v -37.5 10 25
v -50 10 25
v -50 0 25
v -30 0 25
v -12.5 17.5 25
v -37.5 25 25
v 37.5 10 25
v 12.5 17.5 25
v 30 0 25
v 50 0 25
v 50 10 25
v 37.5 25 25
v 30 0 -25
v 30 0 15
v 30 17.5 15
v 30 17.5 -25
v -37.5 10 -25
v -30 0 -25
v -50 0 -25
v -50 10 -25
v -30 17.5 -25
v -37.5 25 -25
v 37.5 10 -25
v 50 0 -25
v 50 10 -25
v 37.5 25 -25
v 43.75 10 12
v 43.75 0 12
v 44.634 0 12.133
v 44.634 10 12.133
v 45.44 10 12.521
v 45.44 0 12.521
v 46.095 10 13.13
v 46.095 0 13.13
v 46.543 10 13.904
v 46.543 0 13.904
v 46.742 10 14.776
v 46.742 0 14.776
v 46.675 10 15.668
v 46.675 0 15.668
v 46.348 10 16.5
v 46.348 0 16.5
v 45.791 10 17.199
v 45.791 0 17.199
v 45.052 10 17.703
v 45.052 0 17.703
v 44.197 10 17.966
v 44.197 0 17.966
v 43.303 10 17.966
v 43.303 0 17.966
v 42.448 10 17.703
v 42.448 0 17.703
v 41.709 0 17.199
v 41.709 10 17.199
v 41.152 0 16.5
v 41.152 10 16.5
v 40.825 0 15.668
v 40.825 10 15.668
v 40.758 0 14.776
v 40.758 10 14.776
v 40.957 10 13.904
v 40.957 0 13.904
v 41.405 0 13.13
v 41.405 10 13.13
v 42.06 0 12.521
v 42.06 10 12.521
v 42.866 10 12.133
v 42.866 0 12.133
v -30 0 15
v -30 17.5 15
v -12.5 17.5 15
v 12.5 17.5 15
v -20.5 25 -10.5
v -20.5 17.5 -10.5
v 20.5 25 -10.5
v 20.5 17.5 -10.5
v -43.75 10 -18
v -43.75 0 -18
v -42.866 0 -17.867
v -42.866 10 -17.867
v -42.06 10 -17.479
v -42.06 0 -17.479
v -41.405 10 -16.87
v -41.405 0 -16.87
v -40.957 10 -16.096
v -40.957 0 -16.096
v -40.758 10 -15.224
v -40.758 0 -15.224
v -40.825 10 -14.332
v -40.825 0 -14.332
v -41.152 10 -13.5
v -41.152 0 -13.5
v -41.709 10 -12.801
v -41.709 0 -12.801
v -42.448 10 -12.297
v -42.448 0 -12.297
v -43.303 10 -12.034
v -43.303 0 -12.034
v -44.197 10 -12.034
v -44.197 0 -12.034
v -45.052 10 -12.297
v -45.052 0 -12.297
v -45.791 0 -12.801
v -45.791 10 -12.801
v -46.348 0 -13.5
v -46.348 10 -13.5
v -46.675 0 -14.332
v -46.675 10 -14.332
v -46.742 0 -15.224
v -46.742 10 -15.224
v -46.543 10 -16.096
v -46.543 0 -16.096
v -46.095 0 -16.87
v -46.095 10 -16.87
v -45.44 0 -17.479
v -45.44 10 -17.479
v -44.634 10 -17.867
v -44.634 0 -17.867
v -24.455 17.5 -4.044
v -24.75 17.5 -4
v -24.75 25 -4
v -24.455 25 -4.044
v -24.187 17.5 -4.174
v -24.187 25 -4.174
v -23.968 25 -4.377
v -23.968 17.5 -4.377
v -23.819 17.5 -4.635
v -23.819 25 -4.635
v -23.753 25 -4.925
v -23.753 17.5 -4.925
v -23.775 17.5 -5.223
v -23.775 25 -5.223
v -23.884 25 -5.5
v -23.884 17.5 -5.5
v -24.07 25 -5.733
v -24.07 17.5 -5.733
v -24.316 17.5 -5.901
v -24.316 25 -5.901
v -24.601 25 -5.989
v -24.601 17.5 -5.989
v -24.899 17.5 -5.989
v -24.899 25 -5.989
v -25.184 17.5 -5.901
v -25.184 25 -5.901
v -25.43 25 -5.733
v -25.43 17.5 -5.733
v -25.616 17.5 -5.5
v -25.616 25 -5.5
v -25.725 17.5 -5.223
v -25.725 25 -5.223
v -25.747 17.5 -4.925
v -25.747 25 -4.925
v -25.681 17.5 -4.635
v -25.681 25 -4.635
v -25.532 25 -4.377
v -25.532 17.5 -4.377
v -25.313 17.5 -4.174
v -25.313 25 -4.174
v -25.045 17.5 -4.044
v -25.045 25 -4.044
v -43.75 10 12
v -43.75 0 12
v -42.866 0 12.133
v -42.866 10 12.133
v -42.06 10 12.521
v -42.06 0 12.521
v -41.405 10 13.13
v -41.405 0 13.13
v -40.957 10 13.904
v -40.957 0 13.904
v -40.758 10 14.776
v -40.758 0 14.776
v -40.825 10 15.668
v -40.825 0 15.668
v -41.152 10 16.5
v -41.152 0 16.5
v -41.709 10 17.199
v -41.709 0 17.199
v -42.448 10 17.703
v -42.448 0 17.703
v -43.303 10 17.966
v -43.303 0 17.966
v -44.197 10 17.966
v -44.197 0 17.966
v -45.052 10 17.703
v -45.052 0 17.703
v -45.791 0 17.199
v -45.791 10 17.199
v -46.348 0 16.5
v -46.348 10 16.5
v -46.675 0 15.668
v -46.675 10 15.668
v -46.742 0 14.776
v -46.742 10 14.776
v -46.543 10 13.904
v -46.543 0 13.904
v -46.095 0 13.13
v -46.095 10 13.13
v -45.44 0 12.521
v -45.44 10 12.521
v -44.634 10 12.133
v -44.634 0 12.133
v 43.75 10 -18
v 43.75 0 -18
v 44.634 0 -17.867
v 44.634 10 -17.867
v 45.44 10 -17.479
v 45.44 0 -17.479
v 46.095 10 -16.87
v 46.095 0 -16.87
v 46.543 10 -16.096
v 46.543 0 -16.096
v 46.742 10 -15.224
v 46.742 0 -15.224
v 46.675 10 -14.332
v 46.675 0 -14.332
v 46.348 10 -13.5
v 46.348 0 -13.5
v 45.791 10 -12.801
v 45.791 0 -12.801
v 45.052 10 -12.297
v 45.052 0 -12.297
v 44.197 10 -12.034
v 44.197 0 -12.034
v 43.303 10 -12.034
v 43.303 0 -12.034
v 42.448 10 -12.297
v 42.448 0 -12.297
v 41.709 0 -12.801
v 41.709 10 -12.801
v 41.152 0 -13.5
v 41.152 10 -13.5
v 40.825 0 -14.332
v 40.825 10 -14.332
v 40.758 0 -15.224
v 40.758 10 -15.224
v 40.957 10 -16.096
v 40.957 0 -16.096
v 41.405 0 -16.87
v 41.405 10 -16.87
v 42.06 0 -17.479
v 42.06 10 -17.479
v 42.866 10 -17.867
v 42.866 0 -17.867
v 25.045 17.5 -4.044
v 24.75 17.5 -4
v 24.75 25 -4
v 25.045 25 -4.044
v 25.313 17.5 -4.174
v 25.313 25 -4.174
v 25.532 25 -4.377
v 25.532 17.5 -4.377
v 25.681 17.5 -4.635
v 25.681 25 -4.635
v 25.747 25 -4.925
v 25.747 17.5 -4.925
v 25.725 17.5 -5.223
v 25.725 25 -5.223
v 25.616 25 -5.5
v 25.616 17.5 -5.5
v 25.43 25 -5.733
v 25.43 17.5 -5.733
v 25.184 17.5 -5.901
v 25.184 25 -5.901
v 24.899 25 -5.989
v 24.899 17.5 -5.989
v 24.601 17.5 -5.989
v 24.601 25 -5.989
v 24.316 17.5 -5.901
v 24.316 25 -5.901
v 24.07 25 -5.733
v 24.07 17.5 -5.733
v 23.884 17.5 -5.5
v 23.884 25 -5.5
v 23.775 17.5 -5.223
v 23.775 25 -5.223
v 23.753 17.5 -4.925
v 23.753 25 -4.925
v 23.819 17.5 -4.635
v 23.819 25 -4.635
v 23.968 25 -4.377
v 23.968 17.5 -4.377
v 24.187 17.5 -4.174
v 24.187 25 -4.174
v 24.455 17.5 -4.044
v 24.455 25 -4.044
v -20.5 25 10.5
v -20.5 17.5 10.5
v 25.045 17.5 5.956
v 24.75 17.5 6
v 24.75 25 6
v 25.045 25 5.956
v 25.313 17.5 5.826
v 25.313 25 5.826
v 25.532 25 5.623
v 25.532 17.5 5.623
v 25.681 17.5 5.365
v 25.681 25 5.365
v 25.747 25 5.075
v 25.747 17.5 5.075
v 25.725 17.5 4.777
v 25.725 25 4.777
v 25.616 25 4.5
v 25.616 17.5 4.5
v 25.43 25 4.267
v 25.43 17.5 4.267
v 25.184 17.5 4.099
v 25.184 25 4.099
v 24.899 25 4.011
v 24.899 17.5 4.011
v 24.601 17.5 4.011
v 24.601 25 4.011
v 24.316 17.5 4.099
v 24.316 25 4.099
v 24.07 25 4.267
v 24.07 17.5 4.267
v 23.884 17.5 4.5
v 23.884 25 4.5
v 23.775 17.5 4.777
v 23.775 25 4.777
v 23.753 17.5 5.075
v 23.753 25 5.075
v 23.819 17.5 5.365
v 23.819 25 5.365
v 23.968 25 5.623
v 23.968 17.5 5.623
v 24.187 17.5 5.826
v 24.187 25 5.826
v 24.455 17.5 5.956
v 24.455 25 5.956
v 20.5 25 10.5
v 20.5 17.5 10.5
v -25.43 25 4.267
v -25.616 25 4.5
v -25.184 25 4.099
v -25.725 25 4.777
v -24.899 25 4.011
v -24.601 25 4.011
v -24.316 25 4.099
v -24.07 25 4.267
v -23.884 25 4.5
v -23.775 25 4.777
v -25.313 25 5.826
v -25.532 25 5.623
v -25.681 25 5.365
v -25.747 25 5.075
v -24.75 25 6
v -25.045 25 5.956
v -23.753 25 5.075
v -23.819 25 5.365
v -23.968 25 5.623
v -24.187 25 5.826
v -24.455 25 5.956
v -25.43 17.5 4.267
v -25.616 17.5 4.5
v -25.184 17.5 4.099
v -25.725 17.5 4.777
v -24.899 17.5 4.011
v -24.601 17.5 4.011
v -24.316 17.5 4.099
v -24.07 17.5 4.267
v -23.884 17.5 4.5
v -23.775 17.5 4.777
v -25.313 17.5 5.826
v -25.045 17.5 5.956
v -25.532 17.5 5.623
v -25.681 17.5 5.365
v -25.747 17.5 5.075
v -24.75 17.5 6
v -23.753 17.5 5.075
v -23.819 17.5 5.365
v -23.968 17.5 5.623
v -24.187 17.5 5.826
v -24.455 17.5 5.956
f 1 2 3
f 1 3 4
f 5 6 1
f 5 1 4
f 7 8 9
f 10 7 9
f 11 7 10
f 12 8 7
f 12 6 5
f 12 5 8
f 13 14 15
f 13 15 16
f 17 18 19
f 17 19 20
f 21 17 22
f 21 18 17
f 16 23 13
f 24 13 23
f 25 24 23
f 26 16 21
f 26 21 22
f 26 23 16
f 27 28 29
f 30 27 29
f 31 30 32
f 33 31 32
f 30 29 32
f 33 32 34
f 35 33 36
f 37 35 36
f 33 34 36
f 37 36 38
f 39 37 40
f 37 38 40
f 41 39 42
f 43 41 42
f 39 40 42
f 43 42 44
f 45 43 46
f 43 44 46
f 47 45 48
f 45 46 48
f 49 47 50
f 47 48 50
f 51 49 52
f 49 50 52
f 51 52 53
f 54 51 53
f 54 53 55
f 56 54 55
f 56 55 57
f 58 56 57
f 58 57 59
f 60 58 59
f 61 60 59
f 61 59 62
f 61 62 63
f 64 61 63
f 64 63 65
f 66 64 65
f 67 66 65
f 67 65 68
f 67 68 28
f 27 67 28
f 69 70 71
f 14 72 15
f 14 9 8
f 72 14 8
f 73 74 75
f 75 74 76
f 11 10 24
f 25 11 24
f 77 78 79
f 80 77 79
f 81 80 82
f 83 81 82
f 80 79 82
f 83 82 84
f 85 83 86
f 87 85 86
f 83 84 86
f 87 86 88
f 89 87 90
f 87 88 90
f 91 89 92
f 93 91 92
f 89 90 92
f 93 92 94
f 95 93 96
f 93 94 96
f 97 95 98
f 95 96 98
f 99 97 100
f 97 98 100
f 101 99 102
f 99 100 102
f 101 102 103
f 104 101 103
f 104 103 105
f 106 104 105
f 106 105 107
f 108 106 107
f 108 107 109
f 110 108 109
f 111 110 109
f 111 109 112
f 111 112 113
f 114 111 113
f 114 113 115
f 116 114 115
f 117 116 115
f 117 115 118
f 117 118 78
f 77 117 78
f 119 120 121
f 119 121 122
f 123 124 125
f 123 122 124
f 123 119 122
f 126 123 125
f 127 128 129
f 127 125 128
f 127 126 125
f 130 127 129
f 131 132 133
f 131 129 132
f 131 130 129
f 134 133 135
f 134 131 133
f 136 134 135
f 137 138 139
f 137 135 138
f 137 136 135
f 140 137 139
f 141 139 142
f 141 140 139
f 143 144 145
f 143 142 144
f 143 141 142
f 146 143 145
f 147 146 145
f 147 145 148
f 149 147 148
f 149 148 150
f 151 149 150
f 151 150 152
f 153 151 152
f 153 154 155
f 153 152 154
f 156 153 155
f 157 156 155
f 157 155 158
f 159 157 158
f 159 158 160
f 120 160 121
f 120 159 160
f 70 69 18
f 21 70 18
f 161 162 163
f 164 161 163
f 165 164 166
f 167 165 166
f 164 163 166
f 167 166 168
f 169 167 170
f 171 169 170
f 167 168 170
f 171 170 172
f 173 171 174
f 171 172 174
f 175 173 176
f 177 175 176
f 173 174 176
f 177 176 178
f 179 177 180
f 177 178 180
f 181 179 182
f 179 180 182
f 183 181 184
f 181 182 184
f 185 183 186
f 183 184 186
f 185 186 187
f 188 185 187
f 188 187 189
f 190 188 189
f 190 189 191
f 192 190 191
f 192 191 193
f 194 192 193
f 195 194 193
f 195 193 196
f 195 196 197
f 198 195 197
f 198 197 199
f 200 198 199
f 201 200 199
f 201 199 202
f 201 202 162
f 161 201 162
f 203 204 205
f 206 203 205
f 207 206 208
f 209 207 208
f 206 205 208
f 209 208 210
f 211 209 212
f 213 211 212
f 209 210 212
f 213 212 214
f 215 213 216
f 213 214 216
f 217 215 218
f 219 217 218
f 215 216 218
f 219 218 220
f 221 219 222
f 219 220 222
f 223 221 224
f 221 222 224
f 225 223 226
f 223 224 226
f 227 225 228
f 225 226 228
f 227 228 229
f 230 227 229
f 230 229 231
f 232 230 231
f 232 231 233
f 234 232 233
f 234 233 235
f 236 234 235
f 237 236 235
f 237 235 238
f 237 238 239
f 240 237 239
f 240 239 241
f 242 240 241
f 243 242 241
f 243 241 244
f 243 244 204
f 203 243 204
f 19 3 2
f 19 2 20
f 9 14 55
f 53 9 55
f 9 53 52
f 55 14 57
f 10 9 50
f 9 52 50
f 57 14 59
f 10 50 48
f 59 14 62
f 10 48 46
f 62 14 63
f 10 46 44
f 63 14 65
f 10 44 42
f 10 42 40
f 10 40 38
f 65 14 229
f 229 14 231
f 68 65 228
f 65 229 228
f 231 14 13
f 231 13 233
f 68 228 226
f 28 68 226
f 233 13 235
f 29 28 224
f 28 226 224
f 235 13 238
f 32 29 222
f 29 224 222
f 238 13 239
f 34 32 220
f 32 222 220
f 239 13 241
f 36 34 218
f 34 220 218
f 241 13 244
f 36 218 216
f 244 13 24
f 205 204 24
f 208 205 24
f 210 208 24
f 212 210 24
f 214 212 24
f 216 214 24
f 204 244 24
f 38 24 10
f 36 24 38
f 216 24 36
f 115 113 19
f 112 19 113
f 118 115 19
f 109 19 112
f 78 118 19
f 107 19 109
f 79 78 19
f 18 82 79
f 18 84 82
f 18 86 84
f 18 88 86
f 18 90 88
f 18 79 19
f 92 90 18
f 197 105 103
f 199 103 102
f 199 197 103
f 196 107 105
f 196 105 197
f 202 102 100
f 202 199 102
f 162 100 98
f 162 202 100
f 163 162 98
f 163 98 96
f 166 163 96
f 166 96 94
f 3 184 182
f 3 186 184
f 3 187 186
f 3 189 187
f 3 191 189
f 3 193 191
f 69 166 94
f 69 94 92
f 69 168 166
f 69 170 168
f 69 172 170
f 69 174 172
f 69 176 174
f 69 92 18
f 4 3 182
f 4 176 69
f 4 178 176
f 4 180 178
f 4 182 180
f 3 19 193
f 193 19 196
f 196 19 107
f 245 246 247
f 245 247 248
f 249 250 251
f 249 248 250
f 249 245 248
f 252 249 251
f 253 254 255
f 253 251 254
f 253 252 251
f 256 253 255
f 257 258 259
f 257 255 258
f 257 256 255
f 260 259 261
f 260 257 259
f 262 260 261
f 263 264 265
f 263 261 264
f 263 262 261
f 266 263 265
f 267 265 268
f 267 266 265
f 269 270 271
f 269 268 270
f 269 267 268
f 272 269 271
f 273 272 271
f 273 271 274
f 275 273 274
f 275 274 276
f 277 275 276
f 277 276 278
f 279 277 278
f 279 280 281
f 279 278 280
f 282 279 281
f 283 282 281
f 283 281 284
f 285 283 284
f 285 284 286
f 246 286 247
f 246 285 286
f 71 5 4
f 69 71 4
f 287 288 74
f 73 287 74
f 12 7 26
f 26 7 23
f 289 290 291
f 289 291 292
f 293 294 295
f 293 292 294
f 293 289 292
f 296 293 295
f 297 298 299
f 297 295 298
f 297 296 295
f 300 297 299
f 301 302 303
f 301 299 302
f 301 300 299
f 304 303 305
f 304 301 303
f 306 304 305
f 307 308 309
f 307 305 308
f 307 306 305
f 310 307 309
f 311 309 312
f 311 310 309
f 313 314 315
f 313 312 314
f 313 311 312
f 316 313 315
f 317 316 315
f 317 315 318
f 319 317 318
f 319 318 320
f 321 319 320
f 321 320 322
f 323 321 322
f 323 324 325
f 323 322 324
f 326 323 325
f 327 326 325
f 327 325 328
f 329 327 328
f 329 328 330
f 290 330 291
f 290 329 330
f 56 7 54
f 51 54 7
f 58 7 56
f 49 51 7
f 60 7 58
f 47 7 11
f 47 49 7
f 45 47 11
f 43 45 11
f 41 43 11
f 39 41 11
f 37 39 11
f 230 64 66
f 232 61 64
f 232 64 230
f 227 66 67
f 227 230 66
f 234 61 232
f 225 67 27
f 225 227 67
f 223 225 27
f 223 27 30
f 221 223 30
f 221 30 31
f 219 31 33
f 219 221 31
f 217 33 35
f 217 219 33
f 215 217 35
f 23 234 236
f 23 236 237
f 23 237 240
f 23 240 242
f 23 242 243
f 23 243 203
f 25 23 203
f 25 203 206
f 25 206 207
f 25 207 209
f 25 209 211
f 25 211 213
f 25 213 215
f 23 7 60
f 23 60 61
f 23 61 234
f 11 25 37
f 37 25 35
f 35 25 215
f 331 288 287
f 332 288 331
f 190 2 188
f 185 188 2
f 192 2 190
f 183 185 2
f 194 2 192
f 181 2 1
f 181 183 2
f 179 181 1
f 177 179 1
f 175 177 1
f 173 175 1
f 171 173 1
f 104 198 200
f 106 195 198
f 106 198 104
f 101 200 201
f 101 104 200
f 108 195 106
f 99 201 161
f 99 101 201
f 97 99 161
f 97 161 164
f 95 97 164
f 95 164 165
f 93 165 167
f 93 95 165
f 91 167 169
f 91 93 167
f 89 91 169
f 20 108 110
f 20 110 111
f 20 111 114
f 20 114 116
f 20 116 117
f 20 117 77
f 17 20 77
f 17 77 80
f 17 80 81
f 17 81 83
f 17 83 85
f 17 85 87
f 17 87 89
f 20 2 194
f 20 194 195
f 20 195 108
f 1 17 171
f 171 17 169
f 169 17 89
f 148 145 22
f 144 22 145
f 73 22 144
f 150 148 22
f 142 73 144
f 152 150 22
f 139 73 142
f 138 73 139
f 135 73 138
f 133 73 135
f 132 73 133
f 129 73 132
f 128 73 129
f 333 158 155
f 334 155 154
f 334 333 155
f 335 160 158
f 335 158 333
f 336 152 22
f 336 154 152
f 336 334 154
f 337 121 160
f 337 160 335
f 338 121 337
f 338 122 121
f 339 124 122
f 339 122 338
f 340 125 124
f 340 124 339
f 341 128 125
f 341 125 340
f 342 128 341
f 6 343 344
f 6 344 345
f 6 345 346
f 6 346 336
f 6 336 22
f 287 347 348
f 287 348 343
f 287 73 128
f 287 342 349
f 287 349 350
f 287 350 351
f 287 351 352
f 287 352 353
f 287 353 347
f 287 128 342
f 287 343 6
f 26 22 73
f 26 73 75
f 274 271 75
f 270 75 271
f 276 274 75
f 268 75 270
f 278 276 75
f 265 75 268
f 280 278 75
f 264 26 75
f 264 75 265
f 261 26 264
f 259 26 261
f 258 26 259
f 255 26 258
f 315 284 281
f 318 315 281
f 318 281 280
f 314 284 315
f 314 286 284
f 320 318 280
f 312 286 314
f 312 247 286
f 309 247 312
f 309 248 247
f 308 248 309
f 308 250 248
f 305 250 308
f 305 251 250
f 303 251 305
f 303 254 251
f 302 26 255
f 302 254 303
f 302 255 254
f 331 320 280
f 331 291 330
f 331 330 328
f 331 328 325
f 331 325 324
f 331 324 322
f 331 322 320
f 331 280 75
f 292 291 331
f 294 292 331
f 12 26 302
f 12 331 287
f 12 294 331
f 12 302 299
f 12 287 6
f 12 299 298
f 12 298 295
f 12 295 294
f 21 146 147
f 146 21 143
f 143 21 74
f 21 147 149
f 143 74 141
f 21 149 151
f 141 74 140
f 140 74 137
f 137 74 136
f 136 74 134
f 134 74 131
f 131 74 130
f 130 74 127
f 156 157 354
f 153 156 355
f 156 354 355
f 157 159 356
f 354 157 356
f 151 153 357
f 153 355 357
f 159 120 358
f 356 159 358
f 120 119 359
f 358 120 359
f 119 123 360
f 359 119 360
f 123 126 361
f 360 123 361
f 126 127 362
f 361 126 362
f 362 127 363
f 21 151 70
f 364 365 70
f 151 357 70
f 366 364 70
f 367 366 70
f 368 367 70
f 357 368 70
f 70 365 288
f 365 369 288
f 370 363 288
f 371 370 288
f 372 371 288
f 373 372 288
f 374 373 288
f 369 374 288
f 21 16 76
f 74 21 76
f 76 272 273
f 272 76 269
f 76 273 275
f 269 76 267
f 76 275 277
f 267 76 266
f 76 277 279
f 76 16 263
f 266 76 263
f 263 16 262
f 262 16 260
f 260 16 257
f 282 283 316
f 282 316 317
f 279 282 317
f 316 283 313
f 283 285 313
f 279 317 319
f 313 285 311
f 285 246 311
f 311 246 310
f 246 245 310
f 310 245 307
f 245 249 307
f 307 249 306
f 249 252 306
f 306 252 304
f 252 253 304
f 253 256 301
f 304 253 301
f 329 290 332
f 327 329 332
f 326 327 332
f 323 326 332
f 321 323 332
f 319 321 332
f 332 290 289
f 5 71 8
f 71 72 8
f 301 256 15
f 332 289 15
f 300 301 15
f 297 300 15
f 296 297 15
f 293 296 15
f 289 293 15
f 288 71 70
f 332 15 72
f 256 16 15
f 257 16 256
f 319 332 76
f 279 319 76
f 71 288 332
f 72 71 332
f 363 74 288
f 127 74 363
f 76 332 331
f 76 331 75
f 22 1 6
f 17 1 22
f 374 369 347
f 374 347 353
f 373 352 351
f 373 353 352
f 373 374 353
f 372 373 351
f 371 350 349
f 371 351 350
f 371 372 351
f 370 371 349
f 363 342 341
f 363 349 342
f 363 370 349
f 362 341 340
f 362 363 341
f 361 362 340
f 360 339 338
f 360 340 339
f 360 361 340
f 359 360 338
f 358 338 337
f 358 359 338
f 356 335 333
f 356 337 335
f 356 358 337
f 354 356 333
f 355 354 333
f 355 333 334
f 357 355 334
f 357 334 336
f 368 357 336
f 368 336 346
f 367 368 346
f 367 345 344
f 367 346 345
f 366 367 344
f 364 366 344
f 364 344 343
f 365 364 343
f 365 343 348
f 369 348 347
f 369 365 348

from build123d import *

# Parameters (mm, degrees)
SKETCH2_W                = 20
SKETCH2_H                = 50
BOSS_EXTRUDE2_DEPTH      = 10
BOSS_EXTRUDE2_2_DEPTH    = 10
SKETCH3_W                = 7.5
SKETCH3_H                = 50
BOSS_EXTRUDE3_DEPTH      = 15
BOSS_EXTRUDE4_REACH      = 89.464
SKETCH4_W                = 50
SKETCH4_H                = 7.5
CUT_EXTRUDE1_DEPTH       = 62.23724357
CUT_EXTRUDE1_DEPTH_BACK  = 62.23724357
SKETCH6_R                = 1
SKETCH6_W                = 41
SKETCH6_H                = 21
F_6_0_6_DIAMETER_HOLE1_D = 6
SKETCH10_W               = 20
SKETCH10_H               = 10
BOSS_EXTRUDE5_DEPTH      = 17.5
CHAMFER1_SIZE            = 20


with BuildPart() as part:
    # Sketch2 → Boss-Extrude2 (new body)
    with BuildSketch(Plane(origin=(0, 0, 0), x_dir=(1, 0, 0), z_dir=(0, 1, 0))):
        with Locations((-40, 0)):
            Rectangle(SKETCH2_W, SKETCH2_H)
    extrude(amount=BOSS_EXTRUDE2_DEPTH)



with BuildPart() as body_2:
    # Sketch2 → Boss-Extrude2 2 (new body)
    with BuildSketch(Plane(origin=(0, 0, 0), x_dir=(1, 0, 0), z_dir=(0, 1, 0))):
        with Locations((40, 0)):
            Rectangle(SKETCH2_W, SKETCH2_H)
    extrude(amount=BOSS_EXTRUDE2_2_DEPTH)


with BuildPart() as part_1:
    add(part.part)

    add(body_2.part)  # Boss-Extrude3 merges body 2
    # Sketch3 → Boss-Extrude3 (add)
    with BuildSketch(Plane(origin=(0, 10, 0), x_dir=(1, 0, 0), z_dir=(0, 1, 0))):
        with Locations((-33.75, 0)):
            Rectangle(SKETCH3_W, SKETCH3_H)
        with Locations((33.75, 0)):
            Rectangle(SKETCH3_W, SKETCH3_H)
    extrude(amount=BOSS_EXTRUDE3_DEPTH)

    # Sketch4 → Boss-Extrude4 (add, up to next)
    with BuildSketch(Plane.ZY.offset(-30), mode=Mode.PRIVATE) as boss_extrude4_sk1:
        with Locations((0, 21.25)):
            Rectangle(SKETCH4_W, SKETCH4_H)
    boss_extrude4_tool1 = extrude(boss_extrude4_sk1.sketch, amount=BOSS_EXTRUDE4_REACH, mode=Mode.PRIVATE) - part_1.part
    add(boss_extrude4_tool1.solids().sort_by_distance((30, 21.25, 0))[0])

    # Sketch6 → Cut-Extrude1 (cut, two sides: drawn at the far end of the back side and taken through both)
    with BuildSketch(Plane(origin=(0, 25, 0), x_dir=(1, 0, 0), z_dir=(0, 1, 0)).offset(-CUT_EXTRUDE1_DEPTH_BACK)):
        with Locations(Location((24.75, 5, 0), (0, 0, 270))):
            Circle(SKETCH6_R)
        with Locations(Location((24.75, -5, 0), (0, 0, 270))):
            Circle(SKETCH6_R)
        with Locations(Location((-24.75, 5, 0), (0, 0, 270))):
            Circle(SKETCH6_R)
        with Locations(Location((-24.75, -5, 0), (0, 0, 270))):
            Circle(SKETCH6_R)
        Rectangle(SKETCH6_W, SKETCH6_H)
    extrude(amount=CUT_EXTRUDE1_DEPTH + CUT_EXTRUDE1_DEPTH_BACK, mode=Mode.SUBTRACT)

    # Ø6.0 (6) Diameter Hole1 (through all)
    with Locations(Plane(origin=(-43.75, 10, -15), x_dir=(0, 0, 1), z_dir=(0, 1, 0))):
        with Locations((0, 0), (30, 0), (30, 87.5), (0, 87.5)):
            Hole(F_6_0_6_DIAMETER_HOLE1_D / 2)

    # Sketch10 → Boss-Extrude5 (add)
    with BuildSketch(Plane.XZ.offset(-17.5)):
        with Locations((-20, 20)):
            Rectangle(SKETCH10_W, SKETCH10_H)
        with Locations((20, 20)):
            Rectangle(SKETCH10_W, SKETCH10_H)
    extrude(amount=BOSS_EXTRUDE5_DEPTH)

    # Chamfer1
    # the kernel refuses this chamfer: 20 mm, written as the material it adds along each edge
    # the kernel refuses this chamfer: 20 mm, written as the material it takes off along each edge
    with BuildSketch(Plane(origin=(10, 0, 76.433659759), x_dir=(0.9996219169112968, -0.027495876610586372, 0), z_dir=(0, 0, -1))) as chamfer1_2_piece_1_section:
        Polygon((CHAMFER1_SIZE * 0.999621916911, -CHAMFER1_SIZE * 0.0274958766106), (-CHAMFER1_SIZE * 0.0274958766106, -CHAMFER1_SIZE * 0.999621916911), (0, 0), align=None)
    chamfer1_2_piece_1 = extrude(amount=112.867319519, mode=Mode.PRIVATE)
    chamfer1_2_piece_1 = split(chamfer1_2_piece_1, bisect_by=Plane(origin=(16.759259259, 17.5, 20), z_dir=(0, -1, 0)), keep=Keep.TOP, mode=Mode.PRIVATE)
    add(chamfer1_2_piece_1, mode=Mode.SUBTRACT)
    with BuildSketch(Plane(origin=(-10, 0, 76.433659759), x_dir=(0.027495876610586403, 0.9996219169112968, 0), z_dir=(0, 0, -1))) as chamfer1_2_piece_2_section:
        Polygon((CHAMFER1_SIZE * 0.999621916911, -CHAMFER1_SIZE * 0.0274958766106), (-CHAMFER1_SIZE * 0.0274958766106, -CHAMFER1_SIZE * 0.999621916911), (0, 0), align=None)
    chamfer1_2_piece_2 = extrude(amount=112.867319519, mode=Mode.PRIVATE)
    chamfer1_2_piece_2 = split(chamfer1_2_piece_2, bisect_by=Plane(origin=(-16.759259259, 17.5, 20), z_dir=(0, -1, 0)), keep=Keep.TOP, mode=Mode.PRIVATE)
    add(chamfer1_2_piece_2, mode=Mode.SUBTRACT)


solid = part_1.part
